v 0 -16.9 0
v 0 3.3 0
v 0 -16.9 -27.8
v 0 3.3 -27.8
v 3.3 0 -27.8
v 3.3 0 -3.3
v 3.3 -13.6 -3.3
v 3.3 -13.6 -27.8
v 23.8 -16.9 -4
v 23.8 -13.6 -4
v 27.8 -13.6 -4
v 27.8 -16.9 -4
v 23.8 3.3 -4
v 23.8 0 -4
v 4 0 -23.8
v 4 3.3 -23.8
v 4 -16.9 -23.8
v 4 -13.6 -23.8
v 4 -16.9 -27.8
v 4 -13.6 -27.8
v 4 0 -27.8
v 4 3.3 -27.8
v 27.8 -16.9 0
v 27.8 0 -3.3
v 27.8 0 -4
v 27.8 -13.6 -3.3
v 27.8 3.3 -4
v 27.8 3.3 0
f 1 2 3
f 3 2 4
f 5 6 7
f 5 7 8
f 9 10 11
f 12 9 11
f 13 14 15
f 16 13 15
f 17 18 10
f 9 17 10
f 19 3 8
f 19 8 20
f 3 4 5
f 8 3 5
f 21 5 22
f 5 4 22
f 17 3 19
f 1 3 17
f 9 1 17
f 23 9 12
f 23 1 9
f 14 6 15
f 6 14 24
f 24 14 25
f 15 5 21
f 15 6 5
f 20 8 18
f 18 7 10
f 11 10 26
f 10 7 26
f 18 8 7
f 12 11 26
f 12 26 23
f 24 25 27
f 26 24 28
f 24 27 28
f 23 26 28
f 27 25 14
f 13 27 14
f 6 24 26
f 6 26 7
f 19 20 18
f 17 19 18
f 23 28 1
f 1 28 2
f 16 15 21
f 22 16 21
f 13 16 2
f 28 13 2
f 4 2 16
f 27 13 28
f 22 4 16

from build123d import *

# Parameters (mm, degrees)
BOSS_EXTRUDE1_DEPTH = 3.3
BOSS_EXTRUDE2_DEPTH = 13.6
BOSS_EXTRUDE3_DEPTH = 3.3


with BuildPart() as part:
    # Sketch1 → Boss-Extrude1 (new body)
    with BuildSketch(Plane(origin=(0, 0, 0), x_dir=(1, 0, 0), z_dir=(0, 1, 0))):
        Polygon((0, 0), (27.8, 0), (27.8, 4), (23.8, 4), (4, 23.8), (4, 27.8), (0, 27.8), align=None)
    extrude(amount=BOSS_EXTRUDE1_DEPTH)

    # Sketch2 → Boss-Extrude2 (add)
    with BuildSketch(Plane.XZ):
        Polygon((0, 0), (27.8, 0), (27.8, -3.3), (3.3, -3.3), (3.3, -27.8), (0, -27.8), align=None)
    extrude(amount=BOSS_EXTRUDE2_DEPTH)

    # Sketch3 → Boss-Extrude3 (add)
    with BuildSketch(Plane.XZ.offset(13.6)):
        Polygon((27.8, -3.3), (27.8, 0), (0, 0), (0, -27.8), (3.3, -27.8), (4, -27.8), (4, -23.8), (23.8, -4), (27.8, -4), align=None)
    extrude(amount=BOSS_EXTRUDE3_DEPTH)


solid = part.part
